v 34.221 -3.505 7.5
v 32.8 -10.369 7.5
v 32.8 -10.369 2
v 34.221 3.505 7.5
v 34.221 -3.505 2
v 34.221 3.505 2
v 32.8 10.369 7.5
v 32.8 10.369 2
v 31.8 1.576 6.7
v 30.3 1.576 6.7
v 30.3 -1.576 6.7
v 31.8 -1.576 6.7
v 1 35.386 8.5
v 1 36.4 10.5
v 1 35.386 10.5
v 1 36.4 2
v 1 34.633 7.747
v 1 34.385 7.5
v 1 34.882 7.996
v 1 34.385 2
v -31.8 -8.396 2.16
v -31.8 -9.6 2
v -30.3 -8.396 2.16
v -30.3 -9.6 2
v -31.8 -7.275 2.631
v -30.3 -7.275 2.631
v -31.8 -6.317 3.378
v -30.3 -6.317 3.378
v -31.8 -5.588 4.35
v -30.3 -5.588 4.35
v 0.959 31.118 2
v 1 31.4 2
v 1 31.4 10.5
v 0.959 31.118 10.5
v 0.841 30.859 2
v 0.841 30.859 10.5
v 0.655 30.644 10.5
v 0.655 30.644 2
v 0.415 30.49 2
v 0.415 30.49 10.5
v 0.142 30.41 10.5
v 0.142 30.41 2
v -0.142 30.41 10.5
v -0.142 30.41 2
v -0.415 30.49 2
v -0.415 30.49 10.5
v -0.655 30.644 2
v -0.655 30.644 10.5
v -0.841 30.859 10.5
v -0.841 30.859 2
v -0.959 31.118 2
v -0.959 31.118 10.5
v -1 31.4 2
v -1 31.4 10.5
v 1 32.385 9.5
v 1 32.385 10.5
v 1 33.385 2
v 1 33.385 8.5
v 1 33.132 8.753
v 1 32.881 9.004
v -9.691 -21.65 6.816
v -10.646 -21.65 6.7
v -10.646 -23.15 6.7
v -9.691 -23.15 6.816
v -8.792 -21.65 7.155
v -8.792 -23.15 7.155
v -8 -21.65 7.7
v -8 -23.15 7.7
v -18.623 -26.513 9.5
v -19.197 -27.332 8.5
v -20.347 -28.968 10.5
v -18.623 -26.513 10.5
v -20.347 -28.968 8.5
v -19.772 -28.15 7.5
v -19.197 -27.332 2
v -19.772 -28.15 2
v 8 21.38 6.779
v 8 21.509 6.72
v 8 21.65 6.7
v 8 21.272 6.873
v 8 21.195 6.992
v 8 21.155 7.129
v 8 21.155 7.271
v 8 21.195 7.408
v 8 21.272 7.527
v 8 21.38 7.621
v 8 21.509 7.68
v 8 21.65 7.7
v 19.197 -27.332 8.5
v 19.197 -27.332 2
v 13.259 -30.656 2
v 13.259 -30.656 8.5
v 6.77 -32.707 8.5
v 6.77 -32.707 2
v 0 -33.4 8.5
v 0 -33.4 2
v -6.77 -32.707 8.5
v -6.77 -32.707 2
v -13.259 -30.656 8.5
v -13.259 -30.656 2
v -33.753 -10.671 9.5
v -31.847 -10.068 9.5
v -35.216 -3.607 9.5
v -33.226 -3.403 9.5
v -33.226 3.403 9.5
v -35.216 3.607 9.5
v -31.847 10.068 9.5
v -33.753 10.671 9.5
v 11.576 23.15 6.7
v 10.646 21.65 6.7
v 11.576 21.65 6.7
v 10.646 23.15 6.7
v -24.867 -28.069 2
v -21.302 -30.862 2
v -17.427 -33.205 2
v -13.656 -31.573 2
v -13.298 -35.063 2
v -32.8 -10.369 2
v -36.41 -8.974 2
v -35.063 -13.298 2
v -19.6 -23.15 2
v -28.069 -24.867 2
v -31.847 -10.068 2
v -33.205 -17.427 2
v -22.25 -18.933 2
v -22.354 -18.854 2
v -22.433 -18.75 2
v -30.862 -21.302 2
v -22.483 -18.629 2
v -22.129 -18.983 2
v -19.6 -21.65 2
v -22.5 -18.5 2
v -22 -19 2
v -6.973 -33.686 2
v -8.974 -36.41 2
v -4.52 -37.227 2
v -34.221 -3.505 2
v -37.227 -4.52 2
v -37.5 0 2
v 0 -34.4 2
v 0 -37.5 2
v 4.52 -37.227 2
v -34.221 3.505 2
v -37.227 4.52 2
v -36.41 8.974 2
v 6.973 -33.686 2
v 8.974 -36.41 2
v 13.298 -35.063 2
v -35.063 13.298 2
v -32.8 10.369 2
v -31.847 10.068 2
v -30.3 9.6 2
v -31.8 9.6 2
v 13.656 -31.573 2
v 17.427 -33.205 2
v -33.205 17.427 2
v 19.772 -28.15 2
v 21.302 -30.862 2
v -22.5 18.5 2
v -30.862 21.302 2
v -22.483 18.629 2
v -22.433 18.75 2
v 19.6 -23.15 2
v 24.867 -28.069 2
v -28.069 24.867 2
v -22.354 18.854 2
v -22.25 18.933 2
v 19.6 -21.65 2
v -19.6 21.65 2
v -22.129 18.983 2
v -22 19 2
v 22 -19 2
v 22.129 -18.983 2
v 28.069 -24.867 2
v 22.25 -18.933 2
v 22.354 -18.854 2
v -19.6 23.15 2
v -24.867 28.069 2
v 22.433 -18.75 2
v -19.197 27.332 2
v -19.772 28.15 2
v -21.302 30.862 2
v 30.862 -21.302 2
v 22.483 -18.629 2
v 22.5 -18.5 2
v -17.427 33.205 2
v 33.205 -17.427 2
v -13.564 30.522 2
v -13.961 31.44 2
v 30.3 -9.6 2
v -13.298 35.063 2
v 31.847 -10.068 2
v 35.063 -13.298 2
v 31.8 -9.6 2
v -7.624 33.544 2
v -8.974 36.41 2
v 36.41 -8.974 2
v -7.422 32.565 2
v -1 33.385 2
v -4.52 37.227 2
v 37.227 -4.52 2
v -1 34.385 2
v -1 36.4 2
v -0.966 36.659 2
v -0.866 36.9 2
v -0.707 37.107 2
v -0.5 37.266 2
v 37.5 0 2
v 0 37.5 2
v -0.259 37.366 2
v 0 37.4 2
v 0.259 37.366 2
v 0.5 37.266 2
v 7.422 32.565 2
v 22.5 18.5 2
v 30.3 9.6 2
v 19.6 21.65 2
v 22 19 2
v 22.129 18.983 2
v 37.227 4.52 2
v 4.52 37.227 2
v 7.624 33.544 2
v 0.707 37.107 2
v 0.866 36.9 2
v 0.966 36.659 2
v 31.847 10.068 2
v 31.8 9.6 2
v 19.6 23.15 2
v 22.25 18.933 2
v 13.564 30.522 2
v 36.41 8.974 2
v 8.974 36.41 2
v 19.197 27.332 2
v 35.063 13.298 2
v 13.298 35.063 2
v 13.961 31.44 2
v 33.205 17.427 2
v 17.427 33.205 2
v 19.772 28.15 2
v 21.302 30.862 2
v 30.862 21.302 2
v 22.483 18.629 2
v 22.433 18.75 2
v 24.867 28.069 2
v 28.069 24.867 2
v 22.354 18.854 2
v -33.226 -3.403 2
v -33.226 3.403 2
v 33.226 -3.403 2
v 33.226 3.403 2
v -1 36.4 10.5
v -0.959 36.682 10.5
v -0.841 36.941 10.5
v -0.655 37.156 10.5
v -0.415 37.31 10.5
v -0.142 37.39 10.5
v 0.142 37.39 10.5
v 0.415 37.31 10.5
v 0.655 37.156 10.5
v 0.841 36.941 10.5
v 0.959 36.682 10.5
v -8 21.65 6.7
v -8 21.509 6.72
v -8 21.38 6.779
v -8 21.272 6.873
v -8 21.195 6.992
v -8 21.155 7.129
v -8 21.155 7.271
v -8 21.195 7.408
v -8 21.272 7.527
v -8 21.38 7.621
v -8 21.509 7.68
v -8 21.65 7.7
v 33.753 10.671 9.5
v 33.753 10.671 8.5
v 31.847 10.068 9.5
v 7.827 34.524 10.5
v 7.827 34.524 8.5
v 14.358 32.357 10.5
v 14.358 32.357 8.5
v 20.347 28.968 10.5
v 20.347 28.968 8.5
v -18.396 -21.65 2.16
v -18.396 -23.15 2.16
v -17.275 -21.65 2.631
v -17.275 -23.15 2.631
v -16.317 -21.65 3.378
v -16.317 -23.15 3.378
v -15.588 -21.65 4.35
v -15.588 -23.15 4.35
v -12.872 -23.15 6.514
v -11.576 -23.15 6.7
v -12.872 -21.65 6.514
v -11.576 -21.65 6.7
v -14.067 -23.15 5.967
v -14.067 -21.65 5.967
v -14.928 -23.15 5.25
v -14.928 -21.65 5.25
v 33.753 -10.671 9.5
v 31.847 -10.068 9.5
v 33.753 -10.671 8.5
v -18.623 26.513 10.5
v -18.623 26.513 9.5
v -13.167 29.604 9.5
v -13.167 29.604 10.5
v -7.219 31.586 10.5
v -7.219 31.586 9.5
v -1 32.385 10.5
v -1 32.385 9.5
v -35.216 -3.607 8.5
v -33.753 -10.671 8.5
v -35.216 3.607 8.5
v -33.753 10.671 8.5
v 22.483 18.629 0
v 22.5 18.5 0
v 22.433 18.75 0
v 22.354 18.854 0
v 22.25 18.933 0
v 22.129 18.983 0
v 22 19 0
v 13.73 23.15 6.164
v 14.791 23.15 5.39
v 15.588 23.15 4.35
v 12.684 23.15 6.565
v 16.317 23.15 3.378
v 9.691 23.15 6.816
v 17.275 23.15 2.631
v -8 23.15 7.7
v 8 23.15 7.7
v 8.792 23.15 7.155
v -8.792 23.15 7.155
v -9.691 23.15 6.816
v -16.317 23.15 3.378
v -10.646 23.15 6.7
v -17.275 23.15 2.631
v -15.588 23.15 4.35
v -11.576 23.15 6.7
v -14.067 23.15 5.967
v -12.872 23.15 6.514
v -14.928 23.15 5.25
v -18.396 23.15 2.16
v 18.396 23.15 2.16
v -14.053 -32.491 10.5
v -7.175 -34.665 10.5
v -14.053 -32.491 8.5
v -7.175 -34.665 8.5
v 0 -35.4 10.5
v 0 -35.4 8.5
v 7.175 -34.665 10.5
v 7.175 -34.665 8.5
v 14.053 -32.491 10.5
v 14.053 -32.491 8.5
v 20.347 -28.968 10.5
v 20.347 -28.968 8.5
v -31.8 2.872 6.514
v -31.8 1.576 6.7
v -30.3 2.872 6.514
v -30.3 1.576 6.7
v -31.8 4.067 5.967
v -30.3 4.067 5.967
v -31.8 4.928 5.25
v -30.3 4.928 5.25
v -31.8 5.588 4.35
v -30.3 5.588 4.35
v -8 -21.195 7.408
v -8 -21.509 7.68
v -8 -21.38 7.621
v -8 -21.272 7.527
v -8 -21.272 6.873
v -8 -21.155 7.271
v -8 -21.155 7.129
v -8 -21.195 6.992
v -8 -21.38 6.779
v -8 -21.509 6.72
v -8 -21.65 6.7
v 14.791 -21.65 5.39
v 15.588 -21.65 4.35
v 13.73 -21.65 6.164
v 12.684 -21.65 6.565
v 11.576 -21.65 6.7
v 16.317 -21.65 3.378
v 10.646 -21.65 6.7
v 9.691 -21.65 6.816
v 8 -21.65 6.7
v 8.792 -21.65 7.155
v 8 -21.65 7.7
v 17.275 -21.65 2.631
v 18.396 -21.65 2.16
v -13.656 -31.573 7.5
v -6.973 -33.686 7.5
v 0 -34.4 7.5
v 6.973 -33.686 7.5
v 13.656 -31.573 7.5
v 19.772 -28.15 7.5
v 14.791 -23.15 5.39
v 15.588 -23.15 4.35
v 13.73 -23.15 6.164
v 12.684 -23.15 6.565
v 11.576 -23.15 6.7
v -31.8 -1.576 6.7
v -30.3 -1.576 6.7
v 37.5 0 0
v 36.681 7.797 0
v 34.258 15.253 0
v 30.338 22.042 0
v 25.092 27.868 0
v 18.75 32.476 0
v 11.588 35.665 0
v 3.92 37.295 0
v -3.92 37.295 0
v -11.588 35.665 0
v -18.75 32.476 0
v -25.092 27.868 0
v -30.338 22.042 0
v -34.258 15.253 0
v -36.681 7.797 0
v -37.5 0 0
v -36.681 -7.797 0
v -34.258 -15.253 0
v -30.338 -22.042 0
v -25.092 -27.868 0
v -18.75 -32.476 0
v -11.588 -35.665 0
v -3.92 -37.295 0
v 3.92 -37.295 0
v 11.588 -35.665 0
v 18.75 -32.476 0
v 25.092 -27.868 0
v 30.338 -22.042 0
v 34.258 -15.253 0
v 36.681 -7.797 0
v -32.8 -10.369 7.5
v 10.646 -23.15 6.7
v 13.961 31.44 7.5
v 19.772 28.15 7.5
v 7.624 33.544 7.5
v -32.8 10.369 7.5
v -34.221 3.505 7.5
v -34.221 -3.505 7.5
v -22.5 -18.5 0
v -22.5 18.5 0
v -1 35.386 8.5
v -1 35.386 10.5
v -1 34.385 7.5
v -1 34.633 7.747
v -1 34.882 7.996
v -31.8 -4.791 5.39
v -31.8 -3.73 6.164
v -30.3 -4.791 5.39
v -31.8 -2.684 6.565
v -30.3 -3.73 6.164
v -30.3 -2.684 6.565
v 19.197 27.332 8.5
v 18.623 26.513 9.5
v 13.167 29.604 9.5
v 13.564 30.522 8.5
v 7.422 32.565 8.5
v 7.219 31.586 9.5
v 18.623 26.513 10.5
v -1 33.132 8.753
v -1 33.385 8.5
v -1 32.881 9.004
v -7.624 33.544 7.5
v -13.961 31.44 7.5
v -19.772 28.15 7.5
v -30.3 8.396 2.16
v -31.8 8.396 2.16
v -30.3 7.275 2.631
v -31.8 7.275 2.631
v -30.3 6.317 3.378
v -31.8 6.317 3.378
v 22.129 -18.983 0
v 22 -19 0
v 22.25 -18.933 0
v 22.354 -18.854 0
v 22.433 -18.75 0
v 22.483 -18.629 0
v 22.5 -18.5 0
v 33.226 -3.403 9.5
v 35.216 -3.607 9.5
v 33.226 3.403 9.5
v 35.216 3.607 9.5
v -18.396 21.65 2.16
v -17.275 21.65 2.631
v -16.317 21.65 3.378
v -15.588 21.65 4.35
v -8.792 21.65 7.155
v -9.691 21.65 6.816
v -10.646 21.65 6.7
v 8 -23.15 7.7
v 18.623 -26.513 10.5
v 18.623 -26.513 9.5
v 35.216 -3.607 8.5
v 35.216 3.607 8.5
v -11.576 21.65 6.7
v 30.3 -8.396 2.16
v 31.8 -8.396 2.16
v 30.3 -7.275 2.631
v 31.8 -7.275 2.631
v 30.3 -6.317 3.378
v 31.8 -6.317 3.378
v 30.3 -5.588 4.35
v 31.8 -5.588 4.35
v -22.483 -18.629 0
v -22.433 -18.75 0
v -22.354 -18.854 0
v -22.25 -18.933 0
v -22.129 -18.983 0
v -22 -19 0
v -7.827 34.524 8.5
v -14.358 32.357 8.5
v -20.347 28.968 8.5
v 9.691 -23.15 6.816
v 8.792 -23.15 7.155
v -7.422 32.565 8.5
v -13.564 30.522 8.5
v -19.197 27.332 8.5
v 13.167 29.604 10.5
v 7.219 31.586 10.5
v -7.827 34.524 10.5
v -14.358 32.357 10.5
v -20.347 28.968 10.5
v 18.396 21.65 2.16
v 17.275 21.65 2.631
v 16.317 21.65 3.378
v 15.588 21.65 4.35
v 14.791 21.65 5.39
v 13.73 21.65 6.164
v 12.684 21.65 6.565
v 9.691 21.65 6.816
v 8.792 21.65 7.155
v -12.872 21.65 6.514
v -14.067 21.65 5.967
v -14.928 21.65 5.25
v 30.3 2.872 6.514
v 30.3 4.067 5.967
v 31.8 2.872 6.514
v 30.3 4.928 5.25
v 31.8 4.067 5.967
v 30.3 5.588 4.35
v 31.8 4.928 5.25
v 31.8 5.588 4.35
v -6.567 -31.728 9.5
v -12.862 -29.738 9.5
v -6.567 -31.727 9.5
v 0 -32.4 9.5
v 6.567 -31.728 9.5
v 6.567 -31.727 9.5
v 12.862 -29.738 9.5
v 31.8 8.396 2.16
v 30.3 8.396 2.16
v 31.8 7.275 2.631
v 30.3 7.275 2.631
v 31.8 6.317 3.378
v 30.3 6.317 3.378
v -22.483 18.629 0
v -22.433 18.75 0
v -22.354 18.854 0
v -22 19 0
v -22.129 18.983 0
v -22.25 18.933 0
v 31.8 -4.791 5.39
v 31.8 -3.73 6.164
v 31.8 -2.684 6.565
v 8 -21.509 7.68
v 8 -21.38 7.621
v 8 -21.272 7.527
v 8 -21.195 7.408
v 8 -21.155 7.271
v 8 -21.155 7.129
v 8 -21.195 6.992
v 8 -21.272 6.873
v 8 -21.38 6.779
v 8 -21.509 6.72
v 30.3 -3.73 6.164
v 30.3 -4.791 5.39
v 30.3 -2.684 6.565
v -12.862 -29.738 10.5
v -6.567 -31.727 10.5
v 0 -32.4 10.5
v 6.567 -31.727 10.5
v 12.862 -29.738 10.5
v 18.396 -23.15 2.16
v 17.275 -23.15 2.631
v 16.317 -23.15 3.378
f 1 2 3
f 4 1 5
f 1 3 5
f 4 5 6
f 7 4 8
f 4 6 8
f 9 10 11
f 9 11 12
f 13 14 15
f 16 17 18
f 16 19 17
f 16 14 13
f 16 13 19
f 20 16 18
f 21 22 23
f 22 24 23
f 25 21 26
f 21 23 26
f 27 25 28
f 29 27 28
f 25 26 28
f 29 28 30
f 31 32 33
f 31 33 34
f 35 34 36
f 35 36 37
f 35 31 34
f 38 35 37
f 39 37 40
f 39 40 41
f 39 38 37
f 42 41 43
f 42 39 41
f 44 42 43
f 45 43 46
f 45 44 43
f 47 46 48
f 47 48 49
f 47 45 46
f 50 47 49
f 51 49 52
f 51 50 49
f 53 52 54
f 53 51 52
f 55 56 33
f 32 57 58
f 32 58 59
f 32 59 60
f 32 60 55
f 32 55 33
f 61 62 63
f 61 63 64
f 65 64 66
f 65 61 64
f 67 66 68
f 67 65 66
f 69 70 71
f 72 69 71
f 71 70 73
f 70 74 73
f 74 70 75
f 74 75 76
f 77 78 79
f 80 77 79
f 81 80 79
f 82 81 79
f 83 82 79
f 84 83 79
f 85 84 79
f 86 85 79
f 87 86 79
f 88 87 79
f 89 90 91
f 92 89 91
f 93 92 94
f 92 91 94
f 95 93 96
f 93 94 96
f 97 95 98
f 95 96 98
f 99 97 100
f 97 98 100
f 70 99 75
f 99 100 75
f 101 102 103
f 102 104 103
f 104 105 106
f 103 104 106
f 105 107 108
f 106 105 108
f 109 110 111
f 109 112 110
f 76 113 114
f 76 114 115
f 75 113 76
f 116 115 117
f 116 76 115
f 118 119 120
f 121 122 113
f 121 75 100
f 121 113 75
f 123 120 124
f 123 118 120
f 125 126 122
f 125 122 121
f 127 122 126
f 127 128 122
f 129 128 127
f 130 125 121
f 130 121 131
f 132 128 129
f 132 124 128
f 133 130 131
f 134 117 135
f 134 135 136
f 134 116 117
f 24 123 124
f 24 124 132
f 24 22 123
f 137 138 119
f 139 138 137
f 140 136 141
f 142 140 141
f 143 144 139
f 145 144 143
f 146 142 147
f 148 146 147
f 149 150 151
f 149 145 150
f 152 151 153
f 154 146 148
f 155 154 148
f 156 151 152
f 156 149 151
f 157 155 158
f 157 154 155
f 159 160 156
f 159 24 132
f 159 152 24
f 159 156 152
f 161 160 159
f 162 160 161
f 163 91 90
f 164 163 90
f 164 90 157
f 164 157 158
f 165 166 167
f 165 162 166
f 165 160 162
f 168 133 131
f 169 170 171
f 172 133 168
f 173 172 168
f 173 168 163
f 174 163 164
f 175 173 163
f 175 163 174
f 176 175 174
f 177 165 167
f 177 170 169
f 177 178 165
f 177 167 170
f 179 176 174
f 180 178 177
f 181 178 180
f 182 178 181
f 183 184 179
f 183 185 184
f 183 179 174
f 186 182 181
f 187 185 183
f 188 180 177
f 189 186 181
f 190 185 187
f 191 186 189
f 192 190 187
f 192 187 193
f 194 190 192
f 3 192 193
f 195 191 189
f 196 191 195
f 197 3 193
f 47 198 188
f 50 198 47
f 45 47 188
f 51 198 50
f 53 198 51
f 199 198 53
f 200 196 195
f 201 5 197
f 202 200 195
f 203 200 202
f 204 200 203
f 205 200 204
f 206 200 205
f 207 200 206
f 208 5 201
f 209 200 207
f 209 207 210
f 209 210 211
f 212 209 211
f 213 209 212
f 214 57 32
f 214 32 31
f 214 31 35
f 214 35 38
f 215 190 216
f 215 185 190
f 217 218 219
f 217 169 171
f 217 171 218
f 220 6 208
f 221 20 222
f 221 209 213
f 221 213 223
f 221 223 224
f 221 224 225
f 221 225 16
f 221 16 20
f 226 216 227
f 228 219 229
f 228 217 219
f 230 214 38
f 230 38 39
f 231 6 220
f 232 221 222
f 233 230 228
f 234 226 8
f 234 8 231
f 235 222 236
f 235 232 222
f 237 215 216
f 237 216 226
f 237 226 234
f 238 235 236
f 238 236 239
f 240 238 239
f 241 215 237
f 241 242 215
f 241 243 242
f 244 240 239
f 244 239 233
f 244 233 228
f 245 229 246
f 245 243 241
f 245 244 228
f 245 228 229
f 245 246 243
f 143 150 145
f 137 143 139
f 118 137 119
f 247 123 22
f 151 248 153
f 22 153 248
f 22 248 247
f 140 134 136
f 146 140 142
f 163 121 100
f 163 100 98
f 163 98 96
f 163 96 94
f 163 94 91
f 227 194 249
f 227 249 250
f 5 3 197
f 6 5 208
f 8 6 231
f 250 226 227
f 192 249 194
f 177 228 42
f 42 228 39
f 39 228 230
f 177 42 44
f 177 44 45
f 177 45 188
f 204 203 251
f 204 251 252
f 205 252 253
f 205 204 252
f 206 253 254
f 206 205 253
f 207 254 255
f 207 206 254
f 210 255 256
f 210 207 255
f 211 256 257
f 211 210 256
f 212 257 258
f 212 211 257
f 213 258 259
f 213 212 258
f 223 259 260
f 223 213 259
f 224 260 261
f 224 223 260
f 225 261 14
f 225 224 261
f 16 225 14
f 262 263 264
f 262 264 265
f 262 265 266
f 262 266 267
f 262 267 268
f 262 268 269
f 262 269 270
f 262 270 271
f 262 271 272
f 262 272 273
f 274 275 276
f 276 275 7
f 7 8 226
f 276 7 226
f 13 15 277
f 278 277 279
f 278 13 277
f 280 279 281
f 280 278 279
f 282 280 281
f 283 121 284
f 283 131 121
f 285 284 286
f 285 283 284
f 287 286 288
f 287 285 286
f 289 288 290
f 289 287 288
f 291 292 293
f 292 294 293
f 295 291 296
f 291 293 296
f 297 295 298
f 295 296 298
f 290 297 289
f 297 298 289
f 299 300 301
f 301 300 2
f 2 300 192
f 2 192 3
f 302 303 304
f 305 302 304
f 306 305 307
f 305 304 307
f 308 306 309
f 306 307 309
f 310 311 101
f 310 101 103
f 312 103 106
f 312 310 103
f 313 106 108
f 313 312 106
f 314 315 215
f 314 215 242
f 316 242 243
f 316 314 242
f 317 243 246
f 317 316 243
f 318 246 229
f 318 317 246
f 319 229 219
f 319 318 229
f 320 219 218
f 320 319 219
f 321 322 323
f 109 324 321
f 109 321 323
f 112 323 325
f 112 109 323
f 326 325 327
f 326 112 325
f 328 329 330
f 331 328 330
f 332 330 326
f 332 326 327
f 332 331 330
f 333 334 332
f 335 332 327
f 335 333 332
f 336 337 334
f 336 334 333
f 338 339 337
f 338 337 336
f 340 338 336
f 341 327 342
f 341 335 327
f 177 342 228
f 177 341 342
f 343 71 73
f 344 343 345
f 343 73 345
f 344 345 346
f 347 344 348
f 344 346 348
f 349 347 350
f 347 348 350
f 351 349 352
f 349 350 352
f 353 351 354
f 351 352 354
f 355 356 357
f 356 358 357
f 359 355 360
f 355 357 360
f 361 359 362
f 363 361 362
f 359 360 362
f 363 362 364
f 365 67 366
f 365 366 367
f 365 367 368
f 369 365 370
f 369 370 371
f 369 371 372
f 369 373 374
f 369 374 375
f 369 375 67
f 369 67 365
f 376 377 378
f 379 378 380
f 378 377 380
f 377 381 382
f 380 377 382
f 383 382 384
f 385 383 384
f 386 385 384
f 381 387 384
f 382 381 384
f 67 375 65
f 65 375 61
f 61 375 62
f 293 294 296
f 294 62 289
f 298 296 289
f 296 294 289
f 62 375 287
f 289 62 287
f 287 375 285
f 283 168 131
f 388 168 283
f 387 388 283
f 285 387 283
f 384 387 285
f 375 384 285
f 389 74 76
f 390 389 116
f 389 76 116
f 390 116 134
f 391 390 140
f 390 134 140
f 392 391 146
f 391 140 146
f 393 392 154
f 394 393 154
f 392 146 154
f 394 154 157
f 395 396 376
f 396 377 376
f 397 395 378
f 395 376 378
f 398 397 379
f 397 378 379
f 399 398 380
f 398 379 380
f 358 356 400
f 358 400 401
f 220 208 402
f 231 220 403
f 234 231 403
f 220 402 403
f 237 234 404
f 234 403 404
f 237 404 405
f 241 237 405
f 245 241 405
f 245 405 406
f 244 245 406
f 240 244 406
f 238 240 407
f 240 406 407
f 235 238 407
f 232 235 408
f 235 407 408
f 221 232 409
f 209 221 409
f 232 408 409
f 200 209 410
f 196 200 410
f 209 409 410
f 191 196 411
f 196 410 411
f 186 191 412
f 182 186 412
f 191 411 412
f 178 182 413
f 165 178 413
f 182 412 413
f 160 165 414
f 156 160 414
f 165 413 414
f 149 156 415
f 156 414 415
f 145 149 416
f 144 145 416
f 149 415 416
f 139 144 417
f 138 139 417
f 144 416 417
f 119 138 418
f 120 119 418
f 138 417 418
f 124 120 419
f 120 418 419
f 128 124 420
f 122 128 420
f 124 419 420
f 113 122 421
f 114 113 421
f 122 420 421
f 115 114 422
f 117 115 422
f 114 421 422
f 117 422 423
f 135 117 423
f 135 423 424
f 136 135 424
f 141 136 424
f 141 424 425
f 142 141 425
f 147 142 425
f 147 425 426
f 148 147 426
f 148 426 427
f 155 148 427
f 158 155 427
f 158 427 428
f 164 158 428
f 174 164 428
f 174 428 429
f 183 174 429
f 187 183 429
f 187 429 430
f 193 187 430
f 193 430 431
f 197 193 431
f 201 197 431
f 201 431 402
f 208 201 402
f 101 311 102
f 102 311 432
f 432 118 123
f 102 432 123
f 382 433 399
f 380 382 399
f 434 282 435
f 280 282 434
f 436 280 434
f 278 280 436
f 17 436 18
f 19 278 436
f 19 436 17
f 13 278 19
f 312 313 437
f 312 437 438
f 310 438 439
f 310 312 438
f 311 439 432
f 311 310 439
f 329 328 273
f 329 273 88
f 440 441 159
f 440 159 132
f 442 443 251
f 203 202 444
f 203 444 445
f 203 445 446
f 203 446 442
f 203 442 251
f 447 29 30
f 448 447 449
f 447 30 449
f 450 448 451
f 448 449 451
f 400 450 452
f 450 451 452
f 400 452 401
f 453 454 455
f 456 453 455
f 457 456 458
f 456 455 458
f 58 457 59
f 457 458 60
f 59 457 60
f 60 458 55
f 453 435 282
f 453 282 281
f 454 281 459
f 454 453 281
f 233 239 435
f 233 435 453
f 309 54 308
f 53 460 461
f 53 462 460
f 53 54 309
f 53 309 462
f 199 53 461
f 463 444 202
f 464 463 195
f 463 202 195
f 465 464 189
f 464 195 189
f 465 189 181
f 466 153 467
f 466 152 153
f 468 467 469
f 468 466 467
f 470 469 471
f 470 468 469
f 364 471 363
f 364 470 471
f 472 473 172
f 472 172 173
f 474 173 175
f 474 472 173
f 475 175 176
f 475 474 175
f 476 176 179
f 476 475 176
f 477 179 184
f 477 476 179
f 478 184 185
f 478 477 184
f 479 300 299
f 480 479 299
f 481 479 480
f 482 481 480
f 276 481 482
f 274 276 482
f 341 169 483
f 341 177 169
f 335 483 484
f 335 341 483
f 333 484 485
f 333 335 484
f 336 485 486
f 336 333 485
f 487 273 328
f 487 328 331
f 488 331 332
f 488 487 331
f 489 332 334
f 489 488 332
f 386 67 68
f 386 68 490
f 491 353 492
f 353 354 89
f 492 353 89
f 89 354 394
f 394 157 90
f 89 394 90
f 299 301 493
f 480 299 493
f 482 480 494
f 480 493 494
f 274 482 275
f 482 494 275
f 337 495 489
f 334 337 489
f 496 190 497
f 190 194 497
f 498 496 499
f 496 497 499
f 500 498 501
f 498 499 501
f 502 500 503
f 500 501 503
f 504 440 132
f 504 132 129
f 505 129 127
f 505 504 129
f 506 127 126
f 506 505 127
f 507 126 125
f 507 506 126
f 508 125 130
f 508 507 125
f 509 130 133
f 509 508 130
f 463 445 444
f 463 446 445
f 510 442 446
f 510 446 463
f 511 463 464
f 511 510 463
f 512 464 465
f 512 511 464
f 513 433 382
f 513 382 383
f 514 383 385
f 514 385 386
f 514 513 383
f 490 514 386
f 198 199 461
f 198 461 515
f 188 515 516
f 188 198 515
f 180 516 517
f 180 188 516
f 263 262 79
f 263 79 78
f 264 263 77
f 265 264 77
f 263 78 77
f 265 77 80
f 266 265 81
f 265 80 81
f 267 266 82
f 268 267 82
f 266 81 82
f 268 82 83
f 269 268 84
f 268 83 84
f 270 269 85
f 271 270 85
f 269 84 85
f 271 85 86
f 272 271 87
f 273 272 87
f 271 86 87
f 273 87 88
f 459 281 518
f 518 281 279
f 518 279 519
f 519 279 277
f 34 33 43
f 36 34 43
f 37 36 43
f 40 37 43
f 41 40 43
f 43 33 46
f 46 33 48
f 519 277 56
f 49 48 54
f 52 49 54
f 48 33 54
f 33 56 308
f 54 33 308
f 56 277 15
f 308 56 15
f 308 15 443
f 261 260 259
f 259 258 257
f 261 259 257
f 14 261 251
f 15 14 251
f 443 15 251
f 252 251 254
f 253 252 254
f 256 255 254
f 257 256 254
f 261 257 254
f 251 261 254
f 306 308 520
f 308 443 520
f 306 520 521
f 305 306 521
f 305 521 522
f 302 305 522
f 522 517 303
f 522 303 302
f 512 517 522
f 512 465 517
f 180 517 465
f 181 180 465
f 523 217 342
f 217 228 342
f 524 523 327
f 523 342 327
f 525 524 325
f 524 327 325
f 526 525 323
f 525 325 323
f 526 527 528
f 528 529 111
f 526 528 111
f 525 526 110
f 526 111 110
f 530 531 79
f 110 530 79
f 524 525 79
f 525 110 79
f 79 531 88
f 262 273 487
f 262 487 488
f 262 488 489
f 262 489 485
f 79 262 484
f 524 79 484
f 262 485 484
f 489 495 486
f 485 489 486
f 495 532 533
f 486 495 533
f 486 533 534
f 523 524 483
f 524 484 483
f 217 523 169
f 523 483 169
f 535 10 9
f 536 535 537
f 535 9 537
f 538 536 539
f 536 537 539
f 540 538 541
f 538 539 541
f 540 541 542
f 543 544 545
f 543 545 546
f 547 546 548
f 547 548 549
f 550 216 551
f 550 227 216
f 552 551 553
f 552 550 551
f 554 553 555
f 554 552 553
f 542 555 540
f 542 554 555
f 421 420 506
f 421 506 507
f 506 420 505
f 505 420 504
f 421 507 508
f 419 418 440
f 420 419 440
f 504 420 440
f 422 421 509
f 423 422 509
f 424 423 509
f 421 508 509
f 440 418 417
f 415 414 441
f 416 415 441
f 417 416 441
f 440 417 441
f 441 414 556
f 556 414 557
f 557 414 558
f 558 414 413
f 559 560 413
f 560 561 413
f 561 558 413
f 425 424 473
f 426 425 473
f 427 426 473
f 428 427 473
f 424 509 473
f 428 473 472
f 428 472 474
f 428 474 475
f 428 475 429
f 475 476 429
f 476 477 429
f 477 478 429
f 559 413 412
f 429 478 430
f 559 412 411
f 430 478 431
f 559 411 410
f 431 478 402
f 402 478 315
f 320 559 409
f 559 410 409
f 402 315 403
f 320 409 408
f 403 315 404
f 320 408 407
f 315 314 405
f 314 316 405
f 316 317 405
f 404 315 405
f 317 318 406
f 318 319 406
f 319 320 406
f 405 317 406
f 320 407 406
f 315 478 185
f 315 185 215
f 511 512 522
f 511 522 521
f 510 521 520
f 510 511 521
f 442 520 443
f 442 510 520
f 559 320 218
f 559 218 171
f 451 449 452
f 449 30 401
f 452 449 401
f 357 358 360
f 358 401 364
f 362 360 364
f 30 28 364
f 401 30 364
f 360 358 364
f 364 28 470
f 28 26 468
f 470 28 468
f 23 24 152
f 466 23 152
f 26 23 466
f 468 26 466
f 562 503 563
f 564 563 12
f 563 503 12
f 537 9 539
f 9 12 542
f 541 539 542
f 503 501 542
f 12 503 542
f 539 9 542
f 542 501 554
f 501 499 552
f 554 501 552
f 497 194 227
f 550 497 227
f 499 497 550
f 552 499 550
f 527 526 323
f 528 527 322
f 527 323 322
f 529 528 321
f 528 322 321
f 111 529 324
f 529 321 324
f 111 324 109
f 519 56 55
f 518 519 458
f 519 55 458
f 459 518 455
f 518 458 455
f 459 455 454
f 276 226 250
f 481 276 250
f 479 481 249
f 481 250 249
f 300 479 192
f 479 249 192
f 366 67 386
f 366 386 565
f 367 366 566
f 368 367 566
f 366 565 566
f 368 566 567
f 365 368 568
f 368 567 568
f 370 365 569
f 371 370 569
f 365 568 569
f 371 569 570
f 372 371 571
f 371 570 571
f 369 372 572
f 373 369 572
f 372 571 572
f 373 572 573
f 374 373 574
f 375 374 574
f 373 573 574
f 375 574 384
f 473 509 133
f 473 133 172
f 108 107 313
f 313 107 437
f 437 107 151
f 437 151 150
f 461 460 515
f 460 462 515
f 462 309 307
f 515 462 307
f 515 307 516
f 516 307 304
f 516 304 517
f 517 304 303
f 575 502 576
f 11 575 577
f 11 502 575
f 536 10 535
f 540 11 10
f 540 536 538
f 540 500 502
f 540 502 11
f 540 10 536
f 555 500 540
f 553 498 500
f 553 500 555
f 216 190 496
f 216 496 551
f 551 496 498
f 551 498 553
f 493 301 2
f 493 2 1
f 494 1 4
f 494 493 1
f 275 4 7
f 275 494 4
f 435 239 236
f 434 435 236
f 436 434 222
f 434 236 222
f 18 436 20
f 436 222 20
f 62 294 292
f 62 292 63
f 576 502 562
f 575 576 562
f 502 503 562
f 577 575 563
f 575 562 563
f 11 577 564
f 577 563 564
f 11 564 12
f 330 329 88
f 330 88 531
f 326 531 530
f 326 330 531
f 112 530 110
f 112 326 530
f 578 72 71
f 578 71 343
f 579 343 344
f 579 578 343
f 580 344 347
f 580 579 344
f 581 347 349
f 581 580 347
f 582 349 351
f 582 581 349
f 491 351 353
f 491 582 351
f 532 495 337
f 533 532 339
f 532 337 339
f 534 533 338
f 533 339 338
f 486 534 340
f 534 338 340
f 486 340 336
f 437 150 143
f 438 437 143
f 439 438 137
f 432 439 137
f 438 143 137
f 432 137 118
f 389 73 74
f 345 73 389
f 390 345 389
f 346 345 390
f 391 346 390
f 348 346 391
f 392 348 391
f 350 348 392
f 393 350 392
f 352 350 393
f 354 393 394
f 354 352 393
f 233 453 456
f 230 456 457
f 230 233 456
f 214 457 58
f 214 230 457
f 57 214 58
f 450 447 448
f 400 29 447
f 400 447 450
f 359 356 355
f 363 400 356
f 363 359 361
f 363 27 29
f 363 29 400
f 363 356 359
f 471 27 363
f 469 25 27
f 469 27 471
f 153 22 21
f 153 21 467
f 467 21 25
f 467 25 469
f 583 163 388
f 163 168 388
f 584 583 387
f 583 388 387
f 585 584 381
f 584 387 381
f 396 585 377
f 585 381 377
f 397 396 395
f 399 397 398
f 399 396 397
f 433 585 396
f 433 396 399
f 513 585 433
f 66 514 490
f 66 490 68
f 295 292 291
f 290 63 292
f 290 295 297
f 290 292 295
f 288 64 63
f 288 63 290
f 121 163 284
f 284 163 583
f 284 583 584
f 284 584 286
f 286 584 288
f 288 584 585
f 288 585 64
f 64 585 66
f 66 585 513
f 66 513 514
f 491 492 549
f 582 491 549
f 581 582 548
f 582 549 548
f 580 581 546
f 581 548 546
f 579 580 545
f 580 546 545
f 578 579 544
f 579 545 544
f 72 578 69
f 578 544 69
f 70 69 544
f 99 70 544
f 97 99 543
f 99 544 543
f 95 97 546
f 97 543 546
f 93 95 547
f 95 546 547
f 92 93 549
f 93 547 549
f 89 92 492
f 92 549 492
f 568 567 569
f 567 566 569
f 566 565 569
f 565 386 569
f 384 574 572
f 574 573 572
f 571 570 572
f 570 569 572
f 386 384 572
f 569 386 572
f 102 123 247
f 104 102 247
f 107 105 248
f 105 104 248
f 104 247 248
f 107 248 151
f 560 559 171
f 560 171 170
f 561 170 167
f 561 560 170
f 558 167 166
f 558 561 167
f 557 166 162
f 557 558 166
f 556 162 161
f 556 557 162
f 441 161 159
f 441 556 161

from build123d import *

# Parameters (mm, degrees)
ESQUISSE1_R        = 37.50000000000001
BOSS_EXTRU_1_DEPTH = 2
ESQUISSE2_W        = 30.000000000000004
ESQUISSE2_H        = 1.4999999999999964
ESQUISSE2_W_2      = 1.5
ESQUISSE2_H_2      = 10
EXTRU_MINCE1_DEPTH = 4.7
ESQUISSE5_W        = 16
ESQUISSE5_H        = 2.0000000000000036
BOSS_EXTRU_3_DEPTH = 1
CONG_5_R           = 0.5
CONG_6_R           = 0.5
CONG_1_R           = 4.6
CONG_2_R           = 4.6
EXTRU_MINCE2_DEPTH = 6.5
BOSS_EXTRU_2_DEPTH = 1
BOSS_EXTRU_5_DEPTH = 1
BOSS_EXTRU_4_DEPTH = 8.5
CHANFREIN1_SIZE    = 1
CONG_7_R           = 4


# Some blends are built 0.0001 mm under size
with BuildPart() as part:
    # Esquisse1 → Boss.-Extru.1 (new body)
    with BuildSketch(Plane.XY):
        Circle(ESQUISSE1_R)
        with BuildLine():
            Line((-21.999999999999996, -18.999999999999996), (22.000000000000004, -18.999999999999996))
            ThreePointArc((22.000000000000004, -18.999999999999996), (22.353553390593277, -18.85355339059327), (22.500000000000004, -18.499999999999996))
            Line((22.500000000000004, -18.499999999999996), (22.500000000000004, 18.500000000000004))
            ThreePointArc((22.500000000000004, 18.500000000000004), (22.353553390593277, 18.853553390593277), (22.000000000000004, 19.000000000000004))
            Line((22.000000000000004, 19.000000000000004), (-21.999999999999996, 19.000000000000004))
            ThreePointArc((-21.999999999999996, 19.000000000000004), (-22.35355339059327, 18.853553390593277), (-22.499999999999996, 18.500000000000004))
            Line((-22.499999999999996, 18.500000000000004), (-22.499999999999996, -18.499999999999996))
            ThreePointArc((-22.499999999999996, -18.499999999999996), (-22.35355339059327, -18.85355339059327), (-21.999999999999996, -18.999999999999996))
        make_face(mode=Mode.SUBTRACT)
    extrude(amount=BOSS_EXTRU_1_DEPTH)

    # Esquisse2 → Extru.-Mince1 (add)
    with BuildSketch(Plane.XY.offset(2)):
        with Locations((0, 22.4)):
            Rectangle(ESQUISSE2_W, ESQUISSE2_H)
        with Locations((31.05, 0)):
            Rectangle(ESQUISSE2_W_2, ESQUISSE2_H_2)
        with Locations((-31.05, 0)):
            Rectangle(ESQUISSE2_W_2, ESQUISSE2_H_2)
        with Locations((0, -22.4)):
            Rectangle(ESQUISSE2_W, ESQUISSE2_H)
    extrude(amount=EXTRU_MINCE1_DEPTH)

    # Esquisse5 → Boss.-Extru.3 (add)
    with BuildSketch(Plane.XY.offset(6.7)):
        with Locations((0, 22.15)):
            Rectangle(ESQUISSE5_W, ESQUISSE5_H)
        with Locations((0, -22.15)):
            Rectangle(ESQUISSE5_W, ESQUISSE5_H)
    extrude(amount=BOSS_EXTRU_3_DEPTH)

    # Congé5
    # the kernel refuses this fillet: 0.5 mm, written as the material it takes off along each edge
    with BuildSketch(Plane(origin=(9.25, 21.15, 6.7), x_dir=(0, 1, 0), z_dir=(-1, 0, 0))) as cong_5_piece_1:
        with BuildLine():
            CenterArc((CONG_5_R, -CONG_5_R), CONG_5_R, 90, 90)
            Line((0, -CONG_5_R), (0, 0))
            Line((0, 0), (CONG_5_R, 0))
        make_face()
    extrude(amount=18.5, mode=Mode.SUBTRACT)
    with BuildSketch(Plane(origin=(9.25, 21.15, 7.7), x_dir=(0, 0, -1), z_dir=(-1, 0, 0))) as cong_5_piece_2:
        with BuildLine():
            CenterArc((CONG_5_R, -CONG_5_R), CONG_5_R, 90, 90)
            Line((0, -CONG_5_R), (0, 0))
            Line((0, 0), (CONG_5_R, 0))
        make_face()
    extrude(amount=18.5, mode=Mode.SUBTRACT)

    # Congé6
    # the kernel refuses this fillet: 0.5 mm, written as the material it takes off along each edge
    with BuildSketch(Plane(origin=(9.25, -21.15, 6.7), x_dir=(0, -1, 0), z_dir=(-1, 0, 0))) as cong_6_piece_1:
        with BuildLine():
            CenterArc((CONG_6_R, CONG_6_R), CONG_6_R, 180, 90)
            Line((0, CONG_6_R), (0, 0))
            Line((0, 0), (CONG_6_R, 0))
        make_face()
    extrude(amount=18.5, mode=Mode.SUBTRACT)
    with BuildSketch(Plane(origin=(9.25, -21.15, 7.7), x_dir=(0, -1, 0), z_dir=(-1, 0, 0))) as cong_6_piece_2:
        with BuildLine():
            CenterArc((CONG_6_R, -CONG_6_R), CONG_6_R, 90, 90)
            Line((0, -CONG_6_R), (0, 0))
            Line((0, 0), (CONG_6_R, 0))
        make_face()
    extrude(amount=18.5, mode=Mode.SUBTRACT)

    # Congé1
    cong_1_edges = [part.edges().sort_by_distance(p)[0] for p in [
        (-15, 22.4, 2),
        (15, 22.4, 2),
        (31.05, -5, 2),
        (31.05, 5, 2),
        (-31.05, -5, 2),
        (-31.05, 5, 2),
        (-15, -22.4, 2),
        (15, -22.4, 2),
    ]]
    fillet(cong_1_edges, radius=CONG_1_R)

    # Congé2
    cong_2_edges = [part.edges().sort_by_distance(p)[0] for p in [
        (15, 22.4, 6.7),
        (31.05, 5, 6.7),
        (31.05, -5, 6.7),
        (15, -22.4, 6.7),
        (-15, -22.4, 6.7),
        (-31.05, 5, 6.7),
        (-31.05, -5, 6.7),
        (-15, 22.4, 6.7),
    ]]
    fillet(cong_2_edges, radius=CONG_2_R)

    # Esquisse3 → Extru.-Mince2 (add)
    with BuildSketch(Plane.XY.offset(2)):
        with BuildLine():
            ThreePointArc((-32.80000000000001, 10.369185117452545), (-34.4, 4.21e-15), (-32.80000000000001, -10.369185117452545))
            Line((-32.80000000000001, -10.369185117452545), (-31.84651162790699, -10.0677553175266))
            ThreePointArc((-31.84651162790699, -10.0677553175266), (-33.4, -4.09e-15), (-31.84651162790699, 10.0677553175266))
            Line((-31.84651162790699, 10.0677553175266), (-32.80000000000001, 10.369185117452545))
        make_face()
        with BuildLine():
            ThreePointArc((-19.772139489696098, -28.150000000000002), (2.11e-15, -34.4), (19.772139489696098, -28.150000000000002))
            Line((19.772139489696098, -28.150000000000002), (19.197367992902606, -27.33168604651163))
            ThreePointArc((19.197367992902606, -27.33168604651163), (2.05e-15, -33.4), (-19.197367992902606, -27.33168604651163))
            Line((-19.197367992902606, -27.33168604651163), (-19.772139489696098, -28.150000000000002))
        make_face()
        with BuildLine():
            ThreePointArc((32.80000000000001, -10.369185117452545), (34.4, 0), (32.80000000000001, 10.369185117452545))
            Line((32.80000000000001, 10.369185117452545), (31.84651162790699, 10.0677553175266))
            ThreePointArc((31.84651162790699, 10.0677553175266), (33.4, 0), (31.84651162790699, -10.0677553175266))
            Line((31.84651162790699, -10.0677553175266), (32.80000000000001, -10.369185117452545))
        make_face()
        with BuildLine():
            ThreePointArc((19.772139489696105, 28.15), (2.11e-15, 34.4), (-19.772139489696105, 28.15))
            Line((-19.772139489696105, 28.15), (-19.197367992902613, 27.331686046511628))
            ThreePointArc((-19.197367992902613, 27.331686046511628), (-5.37e-15, 33.4), (19.197367992902613, 27.331686046511628))
            Line((19.197367992902613, 27.331686046511628), (19.772139489696105, 28.15))
        make_face()
    extrude(amount=EXTRU_MINCE2_DEPTH)

    # Esquisse4 → Boss.-Extru.2 (add)
    with BuildSketch(Plane.XY.offset(8.5)):
        with BuildLine():
            Line((-19.197367992902617, 27.331686046511624), (-20.3469109864896, 28.96831395348837))
            ThreePointArc((-20.3469109864896, 28.96831395348837), (-5.69e-15, 35.400000000000006), (20.346910986489593, 28.968313953488376))
            Line((20.346910986489593, 28.968313953488376), (19.19736799290261, 27.331686046511624))
            ThreePointArc((19.19736799290261, 27.331686046511624), (2.05e-15, 33.4), (-19.197367992902617, 27.331686046511624))
        make_face()
        with BuildLine():
            Line((33.75348837209304, 10.67061491737849), (31.84651162790699, 10.067755317526597))
            ThreePointArc((31.84651162790699, 10.067755317526597), (33.4, -3.71e-15), (31.846511627906985, -10.067755317526604))
            Line((31.846511627906985, -10.067755317526604), (33.753488372093045, -10.670614917378492))
            ThreePointArc((33.753488372093045, -10.670614917378492), (35.40000000000001, 0), (33.75348837209304, 10.67061491737849))
        make_face()
        with BuildLine():
            Line((19.197367992902603, -27.331686046511635), (20.346910986489593, -28.968313953488376))
            ThreePointArc((20.346910986489593, -28.968313953488376), (1.003e-14, -35.4), (-20.34691098648957, -28.96831395348839))
            Line((-20.34691098648957, -28.96831395348839), (-19.197367992902635, -27.33168604651161))
            ThreePointArc((-19.197367992902635, -27.33168604651161), (-2.762e-14, -33.4), (19.197367992902603, -27.331686046511635))
        make_face()
        with BuildLine():
            Line((-31.846511627906985, -10.067755317526593), (-33.75348837209304, -10.670614917378492))
            ThreePointArc((-33.75348837209304, -10.670614917378492), (-35.40000000000001, 4.34e-15), (-33.753488372093045, 10.67061491737849))
            Line((-33.753488372093045, 10.67061491737849), (-31.846511627906985, 10.067755317526604))
            ThreePointArc((-31.846511627906985, 10.067755317526604), (-33.4, 4.09e-15), (-31.846511627906985, -10.067755317526593))
        make_face()
    extrude(amount=BOSS_EXTRU_2_DEPTH)

    # Esquisse8 → Boss.-Extru.5 (add)
    with BuildSketch(Plane.XY.offset(9.500000000000002)):
        with BuildLine():
            Line((20.34691098648959, -28.96831395348837), (18.622596496109104, -26.513372093023264))
            ThreePointArc((18.622596496109104, -26.513372093023264), (-4.118e-14, -32.4), (-18.622596496109168, -26.513372093023218))
            Line((-18.622596496109168, -26.513372093023218), (-20.34691098648957, -28.96831395348839))
            ThreePointArc((-20.34691098648957, -28.96831395348839), (1.003e-14, -35.4), (20.34691098648959, -28.96831395348837))
        make_face()
        with BuildLine():
            Line((-20.346910986489604, 28.968313953488373), (-18.622596496109125, 26.51337209302325))
            ThreePointArc((-18.622596496109125, 26.51337209302325), (1.98e-15, 32.4), (18.622596496109125, 26.513372093023253))
            Line((18.622596496109125, 26.513372093023253), (20.346910986489593, 28.968313953488384))
            ThreePointArc((20.346910986489593, 28.968313953488384), (-1.355e-14, 35.40000000000001), (-20.346910986489604, 28.968313953488373))
        make_face()
    extrude(amount=BOSS_EXTRU_5_DEPTH)

    # Esquisse7 → Boss.-Extru.4 (add)
    with BuildSketch(Plane.XY.offset(2)):
        with BuildLine():
            Line((0.9999999999999993, 36.400000000000006), (1.0000000000000009, 31.400000000000006))
            ThreePointArc((1.0000000000000009, 31.400000000000006), (-1.8e-16, 30.400000000000006), (-0.9999999999999996, 31.400000000000006))
            Line((-0.9999999999999996, 31.400000000000006), (-1.000000000000001, 36.400000000000006))
            ThreePointArc((-1.000000000000001, 36.400000000000006), (-1.47e-15, 37.400000000000006), (0.9999999999999993, 36.400000000000006))
        make_face()
    extrude(amount=BOSS_EXTRU_4_DEPTH)

    # Chanfrein1
    chanfrein1_edges = [part.edges().sort_by_distance(p)[0] for p in [
        (10.843924173071517, 32.64612241183745, 8.5),
        (-3.55e-15, -34.39999999999999, 8.5),
        (34.400000000000006, 4e-15, 8.5),
        (-34.4, -8.9e-16, 8.5),
        (-10.542492654739178, 31.692520389277497, 9.5),
        (-1.776e-14, -33.39999999999999, 9.5),
        (10.542492654739181, 31.692520389277497, 9.5),
        (-10.843924173071517, 32.64612241183745, 8.5),
    ]]
    chamfer(chanfrein1_edges, length=CHANFREIN1_SIZE - 0.0001)  # a hair under: the kernel refuses the full size

    # Congé7
    # the kernel refuses this fillet: 4 mm, written as the material it adds along each edge
    with BuildSketch(Plane(origin=(8, -23.150000000000002, 6.7), x_dir=(1, 0, -3.4e-16), z_dir=(0, 1, 0)), Plane(origin=(-8, -21.65, 6.7), x_dir=(-1, 0, -3.4e-16), z_dir=(0, -1, 0))) as cong_7_piece_1:
        with BuildLine():
            CenterArc((2.645751311064592, -4), CONG_7_R, 89.99999999999999, 41.4096221092709)
            Line((-3.4e-16, -1.0000000000000009), (0, 0))
            Line((0, 0), (2.6457513110645934, 0))
        make_face()
    extrude(amount=1.5000000000000036)
    with BuildSketch(Plane(origin=(-8, 21.65, 6.7), x_dir=(0, 0, 1), z_dir=(0, 1, 0))) as cong_7_piece_2:
        with BuildLine():
            CenterArc((3.999999999999999, -2.6457513110645934), CONG_7_R, 138.5903778907291, 41.40962210927091)
            Line((-8.9e-16, -2.6457513110645934), (0, 0))
            Line((0, 0), (1.0000000000000009, 0))
        make_face()
    extrude(amount=1.5000000000000036)
    with BuildSketch(Plane(origin=(8, 23.150000000000002, 6.7), x_dir=(1, 0, -3.4e-16), z_dir=(0, -1, 0))) as cong_7_piece_3:
        with BuildLine():
            CenterArc((2.645751311064592, 4), CONG_7_R, 228.59037789072912, 41.40962210927091)
            Line((-3.4e-16, 1.0000000000000009), (0, 0))
            Line((0, 0), (2.6457513110645934, 0))
        make_face()
    extrude(amount=1.5000000000000036)


solid = part.part
